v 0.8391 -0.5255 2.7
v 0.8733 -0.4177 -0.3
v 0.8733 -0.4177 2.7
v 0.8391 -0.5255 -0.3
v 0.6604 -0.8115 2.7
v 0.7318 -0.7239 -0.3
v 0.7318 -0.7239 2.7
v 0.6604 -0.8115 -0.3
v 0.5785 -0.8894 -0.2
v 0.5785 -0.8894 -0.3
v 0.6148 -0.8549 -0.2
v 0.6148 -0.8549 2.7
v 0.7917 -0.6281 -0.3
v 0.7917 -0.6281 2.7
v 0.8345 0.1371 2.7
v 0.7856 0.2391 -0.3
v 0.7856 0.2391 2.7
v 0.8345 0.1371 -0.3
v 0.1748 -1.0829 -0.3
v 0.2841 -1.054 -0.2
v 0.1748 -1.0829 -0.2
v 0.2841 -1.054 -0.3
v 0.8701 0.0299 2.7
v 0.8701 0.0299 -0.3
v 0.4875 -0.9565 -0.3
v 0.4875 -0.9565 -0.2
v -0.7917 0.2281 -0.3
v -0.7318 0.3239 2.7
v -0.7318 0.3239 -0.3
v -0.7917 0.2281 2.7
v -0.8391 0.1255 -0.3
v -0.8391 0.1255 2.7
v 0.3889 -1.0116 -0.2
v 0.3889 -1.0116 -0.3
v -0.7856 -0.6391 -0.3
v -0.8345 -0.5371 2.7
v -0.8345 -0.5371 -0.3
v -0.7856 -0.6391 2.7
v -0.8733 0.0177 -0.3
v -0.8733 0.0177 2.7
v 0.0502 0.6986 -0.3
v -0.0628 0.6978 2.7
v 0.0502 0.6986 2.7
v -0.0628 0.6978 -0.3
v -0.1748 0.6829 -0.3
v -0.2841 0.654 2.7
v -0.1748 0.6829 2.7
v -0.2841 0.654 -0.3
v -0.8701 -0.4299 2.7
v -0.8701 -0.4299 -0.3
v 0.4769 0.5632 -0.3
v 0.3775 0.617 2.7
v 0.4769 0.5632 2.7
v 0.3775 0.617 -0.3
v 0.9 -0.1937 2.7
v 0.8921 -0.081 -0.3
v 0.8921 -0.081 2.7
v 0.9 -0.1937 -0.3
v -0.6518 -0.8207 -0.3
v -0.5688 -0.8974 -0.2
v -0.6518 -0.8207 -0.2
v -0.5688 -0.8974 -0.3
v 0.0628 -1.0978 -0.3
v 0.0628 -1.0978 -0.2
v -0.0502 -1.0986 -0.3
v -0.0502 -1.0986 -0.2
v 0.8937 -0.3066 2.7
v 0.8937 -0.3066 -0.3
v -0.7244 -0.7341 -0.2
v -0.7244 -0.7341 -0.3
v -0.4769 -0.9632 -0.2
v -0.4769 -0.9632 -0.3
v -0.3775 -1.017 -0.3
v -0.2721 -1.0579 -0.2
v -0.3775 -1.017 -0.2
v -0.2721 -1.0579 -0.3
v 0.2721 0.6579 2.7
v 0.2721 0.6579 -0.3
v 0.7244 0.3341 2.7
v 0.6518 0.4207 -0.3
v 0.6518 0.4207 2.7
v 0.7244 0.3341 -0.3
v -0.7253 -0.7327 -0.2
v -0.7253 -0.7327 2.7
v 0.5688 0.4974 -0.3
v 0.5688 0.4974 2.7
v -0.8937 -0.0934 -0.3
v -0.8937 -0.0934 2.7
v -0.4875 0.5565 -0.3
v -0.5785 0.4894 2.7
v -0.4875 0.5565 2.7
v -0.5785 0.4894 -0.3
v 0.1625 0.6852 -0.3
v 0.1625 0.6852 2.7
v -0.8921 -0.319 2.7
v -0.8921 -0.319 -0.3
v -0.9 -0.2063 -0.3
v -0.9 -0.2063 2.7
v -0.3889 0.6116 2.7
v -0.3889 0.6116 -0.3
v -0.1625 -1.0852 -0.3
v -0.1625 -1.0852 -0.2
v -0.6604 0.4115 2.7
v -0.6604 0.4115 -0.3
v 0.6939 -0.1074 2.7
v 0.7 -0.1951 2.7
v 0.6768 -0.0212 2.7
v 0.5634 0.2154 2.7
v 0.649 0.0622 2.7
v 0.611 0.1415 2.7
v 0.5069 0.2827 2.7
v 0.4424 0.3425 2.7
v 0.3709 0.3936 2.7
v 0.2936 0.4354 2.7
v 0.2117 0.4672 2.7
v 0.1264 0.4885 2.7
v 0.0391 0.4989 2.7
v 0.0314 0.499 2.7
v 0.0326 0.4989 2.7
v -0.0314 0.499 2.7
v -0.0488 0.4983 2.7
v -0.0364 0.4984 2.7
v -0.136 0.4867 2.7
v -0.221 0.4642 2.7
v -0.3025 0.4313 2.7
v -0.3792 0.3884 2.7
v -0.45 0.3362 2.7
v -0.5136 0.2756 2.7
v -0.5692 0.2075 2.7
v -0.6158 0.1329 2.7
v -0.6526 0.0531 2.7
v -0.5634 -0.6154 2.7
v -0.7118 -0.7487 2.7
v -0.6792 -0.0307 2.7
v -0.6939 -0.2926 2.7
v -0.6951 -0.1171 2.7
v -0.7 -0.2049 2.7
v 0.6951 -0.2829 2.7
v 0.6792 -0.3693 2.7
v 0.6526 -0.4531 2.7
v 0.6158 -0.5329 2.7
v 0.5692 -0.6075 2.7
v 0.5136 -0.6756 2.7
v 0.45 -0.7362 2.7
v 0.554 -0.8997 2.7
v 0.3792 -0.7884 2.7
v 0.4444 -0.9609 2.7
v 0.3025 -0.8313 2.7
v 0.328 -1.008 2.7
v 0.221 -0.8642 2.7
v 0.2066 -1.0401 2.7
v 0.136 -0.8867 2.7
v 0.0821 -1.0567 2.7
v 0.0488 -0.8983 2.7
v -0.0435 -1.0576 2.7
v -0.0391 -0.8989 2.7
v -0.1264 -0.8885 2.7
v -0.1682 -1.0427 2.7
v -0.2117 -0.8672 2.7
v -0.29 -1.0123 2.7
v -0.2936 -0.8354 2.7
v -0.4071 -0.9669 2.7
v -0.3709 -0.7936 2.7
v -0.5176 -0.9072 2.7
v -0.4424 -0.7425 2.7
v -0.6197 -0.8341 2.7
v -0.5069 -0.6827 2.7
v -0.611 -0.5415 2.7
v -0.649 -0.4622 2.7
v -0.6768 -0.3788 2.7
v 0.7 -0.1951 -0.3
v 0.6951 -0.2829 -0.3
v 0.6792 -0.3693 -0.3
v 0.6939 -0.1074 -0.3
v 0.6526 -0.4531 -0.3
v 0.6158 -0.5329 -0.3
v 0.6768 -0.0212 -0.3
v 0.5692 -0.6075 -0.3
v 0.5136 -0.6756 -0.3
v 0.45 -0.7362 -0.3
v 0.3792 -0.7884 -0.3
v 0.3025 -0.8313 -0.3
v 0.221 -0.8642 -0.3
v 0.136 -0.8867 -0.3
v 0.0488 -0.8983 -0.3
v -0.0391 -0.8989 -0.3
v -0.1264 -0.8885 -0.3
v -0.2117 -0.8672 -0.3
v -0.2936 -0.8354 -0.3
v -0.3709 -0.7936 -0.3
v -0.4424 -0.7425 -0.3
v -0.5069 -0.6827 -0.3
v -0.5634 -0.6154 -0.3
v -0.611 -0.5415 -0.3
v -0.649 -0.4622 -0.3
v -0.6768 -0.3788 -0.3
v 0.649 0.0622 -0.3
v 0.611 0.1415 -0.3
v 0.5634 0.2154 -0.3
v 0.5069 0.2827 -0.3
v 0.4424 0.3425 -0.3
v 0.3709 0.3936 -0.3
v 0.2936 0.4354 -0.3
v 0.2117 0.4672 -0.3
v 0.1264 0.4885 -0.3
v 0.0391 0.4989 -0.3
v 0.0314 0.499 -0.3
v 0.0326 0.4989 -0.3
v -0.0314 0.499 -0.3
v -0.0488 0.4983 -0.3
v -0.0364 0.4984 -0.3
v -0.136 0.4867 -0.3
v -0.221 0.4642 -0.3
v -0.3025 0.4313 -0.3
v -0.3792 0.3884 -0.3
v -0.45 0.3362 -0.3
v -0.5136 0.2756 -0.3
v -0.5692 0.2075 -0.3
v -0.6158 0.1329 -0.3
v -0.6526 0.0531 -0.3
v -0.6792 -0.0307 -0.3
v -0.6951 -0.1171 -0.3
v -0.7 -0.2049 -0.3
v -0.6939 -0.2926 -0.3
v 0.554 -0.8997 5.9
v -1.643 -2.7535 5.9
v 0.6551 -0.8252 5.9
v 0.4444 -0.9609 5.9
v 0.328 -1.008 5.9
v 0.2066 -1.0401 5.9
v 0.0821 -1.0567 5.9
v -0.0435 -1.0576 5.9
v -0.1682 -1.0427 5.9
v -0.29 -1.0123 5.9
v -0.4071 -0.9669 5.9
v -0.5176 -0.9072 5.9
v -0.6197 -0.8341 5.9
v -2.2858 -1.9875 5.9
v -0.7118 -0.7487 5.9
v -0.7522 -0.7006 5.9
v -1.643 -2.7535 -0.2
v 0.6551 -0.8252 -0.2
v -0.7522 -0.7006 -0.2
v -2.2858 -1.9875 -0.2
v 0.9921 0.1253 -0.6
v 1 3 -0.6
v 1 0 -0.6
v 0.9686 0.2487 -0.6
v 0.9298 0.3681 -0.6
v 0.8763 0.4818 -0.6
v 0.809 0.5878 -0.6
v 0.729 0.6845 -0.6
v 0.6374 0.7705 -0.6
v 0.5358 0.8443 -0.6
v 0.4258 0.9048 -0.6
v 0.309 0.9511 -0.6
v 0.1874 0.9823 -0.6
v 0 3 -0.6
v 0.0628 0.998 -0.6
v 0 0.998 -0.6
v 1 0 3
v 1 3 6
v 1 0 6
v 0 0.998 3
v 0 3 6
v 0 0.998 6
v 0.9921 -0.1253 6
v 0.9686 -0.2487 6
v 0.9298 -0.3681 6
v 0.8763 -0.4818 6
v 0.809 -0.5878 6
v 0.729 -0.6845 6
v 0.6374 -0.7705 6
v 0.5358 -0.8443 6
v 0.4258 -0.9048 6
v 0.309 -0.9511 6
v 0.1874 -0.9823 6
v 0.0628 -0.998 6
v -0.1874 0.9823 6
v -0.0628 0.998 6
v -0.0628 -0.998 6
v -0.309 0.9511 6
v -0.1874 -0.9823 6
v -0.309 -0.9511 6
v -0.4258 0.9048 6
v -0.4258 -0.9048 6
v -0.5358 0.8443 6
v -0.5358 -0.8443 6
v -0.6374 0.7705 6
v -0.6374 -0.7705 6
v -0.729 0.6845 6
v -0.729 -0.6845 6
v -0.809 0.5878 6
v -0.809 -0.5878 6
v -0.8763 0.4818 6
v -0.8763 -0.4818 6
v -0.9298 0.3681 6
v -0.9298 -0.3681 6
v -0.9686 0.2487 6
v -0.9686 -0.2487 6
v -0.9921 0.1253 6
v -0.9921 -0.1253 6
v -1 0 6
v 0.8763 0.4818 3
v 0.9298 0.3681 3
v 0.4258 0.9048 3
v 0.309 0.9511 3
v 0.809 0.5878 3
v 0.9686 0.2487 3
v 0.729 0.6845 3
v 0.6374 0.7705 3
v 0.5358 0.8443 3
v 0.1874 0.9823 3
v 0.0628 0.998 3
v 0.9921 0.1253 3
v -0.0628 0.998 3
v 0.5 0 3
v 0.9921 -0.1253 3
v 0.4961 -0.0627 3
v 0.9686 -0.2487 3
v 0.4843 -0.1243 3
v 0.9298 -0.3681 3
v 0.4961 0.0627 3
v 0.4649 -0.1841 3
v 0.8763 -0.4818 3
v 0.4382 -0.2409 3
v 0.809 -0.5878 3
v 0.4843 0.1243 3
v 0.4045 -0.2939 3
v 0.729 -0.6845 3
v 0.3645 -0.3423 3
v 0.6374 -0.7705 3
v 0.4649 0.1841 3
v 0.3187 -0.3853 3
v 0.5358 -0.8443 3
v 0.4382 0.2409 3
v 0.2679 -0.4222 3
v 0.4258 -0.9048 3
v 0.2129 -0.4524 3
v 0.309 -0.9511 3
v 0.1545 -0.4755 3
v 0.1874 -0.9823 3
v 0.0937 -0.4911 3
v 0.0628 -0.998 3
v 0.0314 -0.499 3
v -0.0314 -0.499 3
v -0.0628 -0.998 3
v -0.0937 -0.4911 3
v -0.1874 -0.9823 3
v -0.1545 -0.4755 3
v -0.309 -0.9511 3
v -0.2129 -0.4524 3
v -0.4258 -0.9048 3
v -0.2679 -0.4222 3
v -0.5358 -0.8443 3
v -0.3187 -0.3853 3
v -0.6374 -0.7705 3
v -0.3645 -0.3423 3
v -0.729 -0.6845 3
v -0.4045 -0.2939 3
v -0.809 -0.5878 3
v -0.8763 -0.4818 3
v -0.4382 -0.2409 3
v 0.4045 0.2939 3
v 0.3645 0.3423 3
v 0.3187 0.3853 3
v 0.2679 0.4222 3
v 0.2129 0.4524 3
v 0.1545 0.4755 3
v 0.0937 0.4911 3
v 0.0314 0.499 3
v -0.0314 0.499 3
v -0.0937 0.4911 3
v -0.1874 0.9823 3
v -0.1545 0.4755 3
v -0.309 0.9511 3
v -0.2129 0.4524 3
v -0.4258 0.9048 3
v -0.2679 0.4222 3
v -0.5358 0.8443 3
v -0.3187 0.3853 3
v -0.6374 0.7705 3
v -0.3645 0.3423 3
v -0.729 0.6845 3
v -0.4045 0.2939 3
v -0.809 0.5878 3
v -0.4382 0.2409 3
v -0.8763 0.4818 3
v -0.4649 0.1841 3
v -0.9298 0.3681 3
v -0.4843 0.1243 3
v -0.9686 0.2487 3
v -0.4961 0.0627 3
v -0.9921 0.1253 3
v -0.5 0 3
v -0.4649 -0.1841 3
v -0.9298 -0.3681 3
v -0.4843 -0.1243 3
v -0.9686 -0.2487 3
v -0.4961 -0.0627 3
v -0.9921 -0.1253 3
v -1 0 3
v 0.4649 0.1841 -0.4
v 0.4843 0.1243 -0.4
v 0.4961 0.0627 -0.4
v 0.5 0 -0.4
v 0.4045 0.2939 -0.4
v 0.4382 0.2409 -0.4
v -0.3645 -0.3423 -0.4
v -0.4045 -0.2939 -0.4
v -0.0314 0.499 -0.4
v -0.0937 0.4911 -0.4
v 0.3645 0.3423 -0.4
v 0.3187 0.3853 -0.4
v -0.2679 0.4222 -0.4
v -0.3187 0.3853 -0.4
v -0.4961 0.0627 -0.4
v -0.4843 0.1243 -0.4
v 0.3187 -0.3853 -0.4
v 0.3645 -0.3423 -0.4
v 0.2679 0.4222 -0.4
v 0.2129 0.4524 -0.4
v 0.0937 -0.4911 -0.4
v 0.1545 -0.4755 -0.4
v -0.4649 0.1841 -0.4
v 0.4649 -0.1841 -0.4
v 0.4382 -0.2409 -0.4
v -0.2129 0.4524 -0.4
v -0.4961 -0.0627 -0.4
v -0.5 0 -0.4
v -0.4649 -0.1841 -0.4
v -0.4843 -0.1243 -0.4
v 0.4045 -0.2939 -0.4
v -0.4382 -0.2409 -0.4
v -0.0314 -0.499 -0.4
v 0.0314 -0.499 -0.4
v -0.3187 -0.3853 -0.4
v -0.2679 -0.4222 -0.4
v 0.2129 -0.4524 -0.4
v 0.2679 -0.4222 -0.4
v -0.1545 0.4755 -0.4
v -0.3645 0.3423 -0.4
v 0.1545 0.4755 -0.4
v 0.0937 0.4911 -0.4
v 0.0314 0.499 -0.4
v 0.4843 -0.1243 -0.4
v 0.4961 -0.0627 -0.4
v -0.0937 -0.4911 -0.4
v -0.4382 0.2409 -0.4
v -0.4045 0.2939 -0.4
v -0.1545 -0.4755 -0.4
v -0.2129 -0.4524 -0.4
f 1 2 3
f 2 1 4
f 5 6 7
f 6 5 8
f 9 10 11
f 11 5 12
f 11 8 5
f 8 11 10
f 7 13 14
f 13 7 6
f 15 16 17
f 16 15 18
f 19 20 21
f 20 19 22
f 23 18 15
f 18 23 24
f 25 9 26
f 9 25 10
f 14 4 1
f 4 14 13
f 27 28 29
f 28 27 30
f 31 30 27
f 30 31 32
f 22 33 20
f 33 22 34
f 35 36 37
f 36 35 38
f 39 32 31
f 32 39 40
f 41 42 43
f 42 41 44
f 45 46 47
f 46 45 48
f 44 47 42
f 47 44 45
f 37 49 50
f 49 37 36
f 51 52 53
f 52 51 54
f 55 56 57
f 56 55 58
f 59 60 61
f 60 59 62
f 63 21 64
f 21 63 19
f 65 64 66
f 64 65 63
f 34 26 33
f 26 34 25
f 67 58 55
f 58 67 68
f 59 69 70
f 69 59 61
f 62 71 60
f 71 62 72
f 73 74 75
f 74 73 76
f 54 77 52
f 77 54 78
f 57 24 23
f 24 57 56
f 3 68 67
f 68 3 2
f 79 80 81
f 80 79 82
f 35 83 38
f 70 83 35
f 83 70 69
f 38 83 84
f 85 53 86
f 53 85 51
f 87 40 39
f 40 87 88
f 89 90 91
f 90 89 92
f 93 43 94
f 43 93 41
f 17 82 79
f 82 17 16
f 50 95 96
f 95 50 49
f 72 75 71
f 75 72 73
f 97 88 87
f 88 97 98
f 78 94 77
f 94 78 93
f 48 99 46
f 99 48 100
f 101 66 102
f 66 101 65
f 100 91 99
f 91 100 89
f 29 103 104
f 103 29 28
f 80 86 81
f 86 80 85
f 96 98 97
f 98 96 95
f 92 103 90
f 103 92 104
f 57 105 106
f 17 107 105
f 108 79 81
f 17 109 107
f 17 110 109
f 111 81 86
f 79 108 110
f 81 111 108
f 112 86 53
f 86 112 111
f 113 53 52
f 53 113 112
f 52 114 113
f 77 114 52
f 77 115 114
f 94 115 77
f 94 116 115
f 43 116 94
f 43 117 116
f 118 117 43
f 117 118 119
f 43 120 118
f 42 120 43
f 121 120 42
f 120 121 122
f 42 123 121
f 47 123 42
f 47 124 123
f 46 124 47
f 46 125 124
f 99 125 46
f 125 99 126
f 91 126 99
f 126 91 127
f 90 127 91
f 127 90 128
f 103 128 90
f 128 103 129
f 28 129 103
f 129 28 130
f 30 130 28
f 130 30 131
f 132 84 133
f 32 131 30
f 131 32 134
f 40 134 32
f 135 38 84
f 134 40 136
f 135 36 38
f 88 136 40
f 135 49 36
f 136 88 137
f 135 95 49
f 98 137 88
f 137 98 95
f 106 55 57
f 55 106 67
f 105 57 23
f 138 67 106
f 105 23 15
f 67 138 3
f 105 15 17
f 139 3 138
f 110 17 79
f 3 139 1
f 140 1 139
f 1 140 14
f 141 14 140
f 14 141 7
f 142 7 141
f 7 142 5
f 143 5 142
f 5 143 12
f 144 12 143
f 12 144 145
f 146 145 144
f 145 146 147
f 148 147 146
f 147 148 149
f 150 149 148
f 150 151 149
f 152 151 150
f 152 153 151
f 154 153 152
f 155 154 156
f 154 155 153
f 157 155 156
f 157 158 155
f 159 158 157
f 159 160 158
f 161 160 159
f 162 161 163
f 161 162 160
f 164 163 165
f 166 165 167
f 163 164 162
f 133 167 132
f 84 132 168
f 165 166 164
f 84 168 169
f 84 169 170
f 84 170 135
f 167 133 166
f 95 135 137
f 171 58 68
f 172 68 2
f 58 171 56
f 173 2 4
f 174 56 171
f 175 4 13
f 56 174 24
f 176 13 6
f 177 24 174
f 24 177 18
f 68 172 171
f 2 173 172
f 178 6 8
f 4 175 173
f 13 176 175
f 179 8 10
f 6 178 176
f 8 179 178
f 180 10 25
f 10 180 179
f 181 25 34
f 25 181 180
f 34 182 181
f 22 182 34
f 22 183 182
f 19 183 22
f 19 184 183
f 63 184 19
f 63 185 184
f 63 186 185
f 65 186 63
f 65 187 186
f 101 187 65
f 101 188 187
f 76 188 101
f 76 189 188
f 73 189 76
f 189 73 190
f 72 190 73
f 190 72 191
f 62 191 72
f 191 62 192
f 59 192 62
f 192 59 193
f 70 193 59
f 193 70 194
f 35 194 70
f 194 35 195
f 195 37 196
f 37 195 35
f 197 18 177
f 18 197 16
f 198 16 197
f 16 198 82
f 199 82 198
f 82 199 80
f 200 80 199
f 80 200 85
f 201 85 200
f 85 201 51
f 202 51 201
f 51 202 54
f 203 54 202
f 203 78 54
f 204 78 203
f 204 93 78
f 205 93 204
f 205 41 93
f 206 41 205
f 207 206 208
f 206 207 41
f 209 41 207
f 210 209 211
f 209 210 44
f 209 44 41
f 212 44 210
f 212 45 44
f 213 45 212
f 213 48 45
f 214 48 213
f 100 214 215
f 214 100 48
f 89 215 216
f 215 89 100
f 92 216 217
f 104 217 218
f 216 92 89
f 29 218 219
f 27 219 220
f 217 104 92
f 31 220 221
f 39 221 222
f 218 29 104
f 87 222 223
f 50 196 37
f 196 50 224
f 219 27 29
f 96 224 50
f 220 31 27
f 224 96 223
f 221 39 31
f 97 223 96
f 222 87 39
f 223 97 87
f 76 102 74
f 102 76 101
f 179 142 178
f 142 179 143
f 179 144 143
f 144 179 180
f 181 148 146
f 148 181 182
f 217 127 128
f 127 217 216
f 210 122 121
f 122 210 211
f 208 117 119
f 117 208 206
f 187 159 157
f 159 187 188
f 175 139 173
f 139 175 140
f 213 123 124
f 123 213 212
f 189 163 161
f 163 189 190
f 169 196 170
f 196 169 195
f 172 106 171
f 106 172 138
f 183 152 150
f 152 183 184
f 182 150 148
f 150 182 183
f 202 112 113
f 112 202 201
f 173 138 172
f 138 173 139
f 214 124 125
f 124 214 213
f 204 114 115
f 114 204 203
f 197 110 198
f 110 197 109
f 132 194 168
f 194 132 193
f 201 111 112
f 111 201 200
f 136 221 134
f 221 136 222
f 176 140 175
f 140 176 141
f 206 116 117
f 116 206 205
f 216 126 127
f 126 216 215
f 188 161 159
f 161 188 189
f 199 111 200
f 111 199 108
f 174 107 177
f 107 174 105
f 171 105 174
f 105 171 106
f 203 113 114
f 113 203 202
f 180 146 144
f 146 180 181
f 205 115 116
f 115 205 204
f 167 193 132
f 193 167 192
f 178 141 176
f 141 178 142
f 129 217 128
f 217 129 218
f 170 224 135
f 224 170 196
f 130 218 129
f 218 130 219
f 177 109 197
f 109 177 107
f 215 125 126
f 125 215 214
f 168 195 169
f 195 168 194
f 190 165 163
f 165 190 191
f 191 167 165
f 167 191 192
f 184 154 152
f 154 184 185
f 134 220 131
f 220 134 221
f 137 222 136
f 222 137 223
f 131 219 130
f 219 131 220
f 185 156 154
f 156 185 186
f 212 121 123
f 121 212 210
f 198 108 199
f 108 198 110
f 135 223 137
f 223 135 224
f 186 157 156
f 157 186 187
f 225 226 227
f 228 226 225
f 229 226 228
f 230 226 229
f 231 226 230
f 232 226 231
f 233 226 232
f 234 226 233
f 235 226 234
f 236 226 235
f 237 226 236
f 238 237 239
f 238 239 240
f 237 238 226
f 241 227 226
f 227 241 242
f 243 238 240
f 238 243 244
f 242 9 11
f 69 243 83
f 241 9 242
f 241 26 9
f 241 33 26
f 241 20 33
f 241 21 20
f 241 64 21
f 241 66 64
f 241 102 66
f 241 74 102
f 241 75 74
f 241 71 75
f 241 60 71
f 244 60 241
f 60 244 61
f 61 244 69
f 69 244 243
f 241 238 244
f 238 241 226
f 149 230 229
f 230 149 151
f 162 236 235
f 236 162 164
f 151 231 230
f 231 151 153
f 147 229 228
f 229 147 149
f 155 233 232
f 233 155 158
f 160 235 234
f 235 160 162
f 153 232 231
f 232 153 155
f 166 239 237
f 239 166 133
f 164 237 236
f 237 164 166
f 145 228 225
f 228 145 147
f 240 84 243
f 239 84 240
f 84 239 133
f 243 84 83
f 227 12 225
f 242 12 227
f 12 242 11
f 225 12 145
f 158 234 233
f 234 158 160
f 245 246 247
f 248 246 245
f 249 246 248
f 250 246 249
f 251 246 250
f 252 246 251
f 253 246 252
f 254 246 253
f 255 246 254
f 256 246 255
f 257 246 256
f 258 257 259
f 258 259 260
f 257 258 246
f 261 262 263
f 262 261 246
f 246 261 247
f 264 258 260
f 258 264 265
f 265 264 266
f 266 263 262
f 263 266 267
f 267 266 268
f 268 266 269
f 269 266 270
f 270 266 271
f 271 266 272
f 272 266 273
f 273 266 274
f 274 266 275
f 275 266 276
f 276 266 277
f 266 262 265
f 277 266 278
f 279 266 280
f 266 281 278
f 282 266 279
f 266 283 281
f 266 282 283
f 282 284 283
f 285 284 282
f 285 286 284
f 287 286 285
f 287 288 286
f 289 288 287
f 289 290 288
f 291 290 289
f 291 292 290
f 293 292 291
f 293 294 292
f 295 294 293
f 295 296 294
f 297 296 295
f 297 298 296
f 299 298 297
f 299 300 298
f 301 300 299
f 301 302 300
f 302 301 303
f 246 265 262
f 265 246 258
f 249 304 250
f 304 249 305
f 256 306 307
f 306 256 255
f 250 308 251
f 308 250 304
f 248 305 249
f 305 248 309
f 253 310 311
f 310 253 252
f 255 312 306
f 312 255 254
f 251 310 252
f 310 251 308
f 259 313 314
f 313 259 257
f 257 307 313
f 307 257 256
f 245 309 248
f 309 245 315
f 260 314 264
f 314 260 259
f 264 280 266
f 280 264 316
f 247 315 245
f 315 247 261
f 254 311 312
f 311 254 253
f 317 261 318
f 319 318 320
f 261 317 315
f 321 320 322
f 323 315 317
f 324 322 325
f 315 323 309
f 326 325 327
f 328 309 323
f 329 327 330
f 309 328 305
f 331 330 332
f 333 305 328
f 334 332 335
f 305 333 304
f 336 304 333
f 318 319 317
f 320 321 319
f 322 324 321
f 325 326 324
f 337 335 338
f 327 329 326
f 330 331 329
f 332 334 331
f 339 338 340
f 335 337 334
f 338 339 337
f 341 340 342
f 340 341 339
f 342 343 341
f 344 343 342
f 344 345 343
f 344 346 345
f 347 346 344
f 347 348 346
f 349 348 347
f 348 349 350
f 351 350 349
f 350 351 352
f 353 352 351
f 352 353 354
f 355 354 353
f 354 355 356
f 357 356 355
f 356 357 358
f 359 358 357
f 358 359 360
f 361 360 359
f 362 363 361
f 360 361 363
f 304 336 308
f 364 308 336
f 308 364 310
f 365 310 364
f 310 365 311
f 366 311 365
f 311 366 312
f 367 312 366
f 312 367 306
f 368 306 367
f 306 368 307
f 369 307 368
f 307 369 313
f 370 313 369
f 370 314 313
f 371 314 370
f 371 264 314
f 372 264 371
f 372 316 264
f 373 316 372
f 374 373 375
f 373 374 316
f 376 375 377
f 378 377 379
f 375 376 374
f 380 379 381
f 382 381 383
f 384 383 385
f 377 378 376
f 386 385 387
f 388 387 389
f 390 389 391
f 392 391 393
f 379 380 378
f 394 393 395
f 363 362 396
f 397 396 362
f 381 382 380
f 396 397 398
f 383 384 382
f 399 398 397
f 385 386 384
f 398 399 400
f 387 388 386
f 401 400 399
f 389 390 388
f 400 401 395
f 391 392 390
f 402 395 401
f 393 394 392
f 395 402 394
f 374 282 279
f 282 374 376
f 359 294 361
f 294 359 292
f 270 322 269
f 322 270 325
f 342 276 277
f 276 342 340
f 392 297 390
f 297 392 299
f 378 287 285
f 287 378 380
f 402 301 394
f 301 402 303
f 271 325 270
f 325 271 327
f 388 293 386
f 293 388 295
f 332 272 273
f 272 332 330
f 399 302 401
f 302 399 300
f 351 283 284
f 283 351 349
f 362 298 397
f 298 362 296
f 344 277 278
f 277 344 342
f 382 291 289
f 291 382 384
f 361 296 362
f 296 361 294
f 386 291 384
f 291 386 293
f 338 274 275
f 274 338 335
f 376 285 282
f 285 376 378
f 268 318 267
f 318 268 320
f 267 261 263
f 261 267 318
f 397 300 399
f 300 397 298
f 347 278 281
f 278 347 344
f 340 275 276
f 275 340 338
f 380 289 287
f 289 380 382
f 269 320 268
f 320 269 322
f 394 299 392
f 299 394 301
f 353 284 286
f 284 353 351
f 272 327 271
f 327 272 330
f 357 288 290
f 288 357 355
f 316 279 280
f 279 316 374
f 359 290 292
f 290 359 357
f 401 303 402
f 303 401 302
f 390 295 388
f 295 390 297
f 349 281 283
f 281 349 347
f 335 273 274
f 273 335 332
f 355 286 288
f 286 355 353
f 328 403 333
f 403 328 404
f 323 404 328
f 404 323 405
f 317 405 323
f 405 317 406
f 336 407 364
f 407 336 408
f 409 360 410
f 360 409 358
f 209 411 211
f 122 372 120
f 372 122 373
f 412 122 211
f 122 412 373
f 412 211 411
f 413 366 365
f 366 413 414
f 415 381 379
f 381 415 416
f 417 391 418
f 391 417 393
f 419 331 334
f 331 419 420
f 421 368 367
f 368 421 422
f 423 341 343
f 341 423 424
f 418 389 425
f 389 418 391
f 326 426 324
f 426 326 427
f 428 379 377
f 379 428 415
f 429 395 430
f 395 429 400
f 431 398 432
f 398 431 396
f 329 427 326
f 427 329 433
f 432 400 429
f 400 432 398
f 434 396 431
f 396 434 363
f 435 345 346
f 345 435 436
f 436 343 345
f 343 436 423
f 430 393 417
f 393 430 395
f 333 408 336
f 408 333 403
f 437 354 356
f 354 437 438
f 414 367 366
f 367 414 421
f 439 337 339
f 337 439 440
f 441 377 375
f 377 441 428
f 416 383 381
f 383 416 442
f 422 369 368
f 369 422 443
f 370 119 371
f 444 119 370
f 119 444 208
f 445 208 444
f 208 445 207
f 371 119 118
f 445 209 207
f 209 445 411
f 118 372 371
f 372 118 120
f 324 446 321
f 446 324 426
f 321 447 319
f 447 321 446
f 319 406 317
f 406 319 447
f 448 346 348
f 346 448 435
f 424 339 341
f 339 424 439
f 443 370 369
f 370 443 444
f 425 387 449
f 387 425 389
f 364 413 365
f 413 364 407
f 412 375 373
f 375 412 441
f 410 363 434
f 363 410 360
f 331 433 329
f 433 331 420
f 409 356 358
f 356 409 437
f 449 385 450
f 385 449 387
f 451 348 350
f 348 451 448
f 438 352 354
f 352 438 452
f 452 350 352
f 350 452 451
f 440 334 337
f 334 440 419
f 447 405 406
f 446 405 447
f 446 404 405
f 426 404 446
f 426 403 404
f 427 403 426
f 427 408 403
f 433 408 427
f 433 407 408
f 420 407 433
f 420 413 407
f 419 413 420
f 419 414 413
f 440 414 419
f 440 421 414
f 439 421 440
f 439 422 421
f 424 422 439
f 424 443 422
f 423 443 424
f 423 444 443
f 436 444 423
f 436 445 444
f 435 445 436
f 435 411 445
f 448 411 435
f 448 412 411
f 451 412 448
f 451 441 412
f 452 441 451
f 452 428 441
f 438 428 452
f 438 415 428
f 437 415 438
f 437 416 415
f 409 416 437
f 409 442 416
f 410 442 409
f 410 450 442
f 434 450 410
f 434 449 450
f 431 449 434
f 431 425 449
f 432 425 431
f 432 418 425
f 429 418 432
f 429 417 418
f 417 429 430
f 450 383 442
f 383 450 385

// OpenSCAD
module block_long() { //long block
 	difference(){
 		cube([6.6, 3, 1]);
 		
 		translate([-1,0,0])
			rotate([0,270,180])
 			cylinder(h=8, r=1, $fn=50);
	}
}

module block_short() { //long block
 	difference(){
 		cube([6.1,3,1]);
 		
 		translate([-1,0,0])
 			rotate([0,270,180])
 			cylinder(h=8, r=1, $fn=50);
 	}
 }
 
 module cylinder_bottom(){
 	difference(){
 		cylinder(h=3, r=0.9, $fn=50);
 
 		translate([0,0,-1])
 			cylinder(h=8, r=0.7, $fn=50);
 	}
 
 	translate([-.1, .1, .1])
 	rotate([0,270,180])
 		block_short();
 }
 
 module cylinder_top(){
 
 	translate([0,0,3])
 		cylinder(h=3, r=1, $fn=50);
 	translate([0,0,-.4]) //innder dowel
 		cylinder(h=6.4, r=.5, $fn=50);
 
 	translate([0, 0, 6])
 		rotate([0,90,0])
 			block_long();
 //	translate([0,0,-.6])
 
 //	cylinder(h=.2, r=1, $fn=50);
 }
 
 color("blue")
 translate([0,-.2,-0.3])
 	rotate([0,0, -50])
 	cylinder_bottom();
 
 
 cylinder_top();
